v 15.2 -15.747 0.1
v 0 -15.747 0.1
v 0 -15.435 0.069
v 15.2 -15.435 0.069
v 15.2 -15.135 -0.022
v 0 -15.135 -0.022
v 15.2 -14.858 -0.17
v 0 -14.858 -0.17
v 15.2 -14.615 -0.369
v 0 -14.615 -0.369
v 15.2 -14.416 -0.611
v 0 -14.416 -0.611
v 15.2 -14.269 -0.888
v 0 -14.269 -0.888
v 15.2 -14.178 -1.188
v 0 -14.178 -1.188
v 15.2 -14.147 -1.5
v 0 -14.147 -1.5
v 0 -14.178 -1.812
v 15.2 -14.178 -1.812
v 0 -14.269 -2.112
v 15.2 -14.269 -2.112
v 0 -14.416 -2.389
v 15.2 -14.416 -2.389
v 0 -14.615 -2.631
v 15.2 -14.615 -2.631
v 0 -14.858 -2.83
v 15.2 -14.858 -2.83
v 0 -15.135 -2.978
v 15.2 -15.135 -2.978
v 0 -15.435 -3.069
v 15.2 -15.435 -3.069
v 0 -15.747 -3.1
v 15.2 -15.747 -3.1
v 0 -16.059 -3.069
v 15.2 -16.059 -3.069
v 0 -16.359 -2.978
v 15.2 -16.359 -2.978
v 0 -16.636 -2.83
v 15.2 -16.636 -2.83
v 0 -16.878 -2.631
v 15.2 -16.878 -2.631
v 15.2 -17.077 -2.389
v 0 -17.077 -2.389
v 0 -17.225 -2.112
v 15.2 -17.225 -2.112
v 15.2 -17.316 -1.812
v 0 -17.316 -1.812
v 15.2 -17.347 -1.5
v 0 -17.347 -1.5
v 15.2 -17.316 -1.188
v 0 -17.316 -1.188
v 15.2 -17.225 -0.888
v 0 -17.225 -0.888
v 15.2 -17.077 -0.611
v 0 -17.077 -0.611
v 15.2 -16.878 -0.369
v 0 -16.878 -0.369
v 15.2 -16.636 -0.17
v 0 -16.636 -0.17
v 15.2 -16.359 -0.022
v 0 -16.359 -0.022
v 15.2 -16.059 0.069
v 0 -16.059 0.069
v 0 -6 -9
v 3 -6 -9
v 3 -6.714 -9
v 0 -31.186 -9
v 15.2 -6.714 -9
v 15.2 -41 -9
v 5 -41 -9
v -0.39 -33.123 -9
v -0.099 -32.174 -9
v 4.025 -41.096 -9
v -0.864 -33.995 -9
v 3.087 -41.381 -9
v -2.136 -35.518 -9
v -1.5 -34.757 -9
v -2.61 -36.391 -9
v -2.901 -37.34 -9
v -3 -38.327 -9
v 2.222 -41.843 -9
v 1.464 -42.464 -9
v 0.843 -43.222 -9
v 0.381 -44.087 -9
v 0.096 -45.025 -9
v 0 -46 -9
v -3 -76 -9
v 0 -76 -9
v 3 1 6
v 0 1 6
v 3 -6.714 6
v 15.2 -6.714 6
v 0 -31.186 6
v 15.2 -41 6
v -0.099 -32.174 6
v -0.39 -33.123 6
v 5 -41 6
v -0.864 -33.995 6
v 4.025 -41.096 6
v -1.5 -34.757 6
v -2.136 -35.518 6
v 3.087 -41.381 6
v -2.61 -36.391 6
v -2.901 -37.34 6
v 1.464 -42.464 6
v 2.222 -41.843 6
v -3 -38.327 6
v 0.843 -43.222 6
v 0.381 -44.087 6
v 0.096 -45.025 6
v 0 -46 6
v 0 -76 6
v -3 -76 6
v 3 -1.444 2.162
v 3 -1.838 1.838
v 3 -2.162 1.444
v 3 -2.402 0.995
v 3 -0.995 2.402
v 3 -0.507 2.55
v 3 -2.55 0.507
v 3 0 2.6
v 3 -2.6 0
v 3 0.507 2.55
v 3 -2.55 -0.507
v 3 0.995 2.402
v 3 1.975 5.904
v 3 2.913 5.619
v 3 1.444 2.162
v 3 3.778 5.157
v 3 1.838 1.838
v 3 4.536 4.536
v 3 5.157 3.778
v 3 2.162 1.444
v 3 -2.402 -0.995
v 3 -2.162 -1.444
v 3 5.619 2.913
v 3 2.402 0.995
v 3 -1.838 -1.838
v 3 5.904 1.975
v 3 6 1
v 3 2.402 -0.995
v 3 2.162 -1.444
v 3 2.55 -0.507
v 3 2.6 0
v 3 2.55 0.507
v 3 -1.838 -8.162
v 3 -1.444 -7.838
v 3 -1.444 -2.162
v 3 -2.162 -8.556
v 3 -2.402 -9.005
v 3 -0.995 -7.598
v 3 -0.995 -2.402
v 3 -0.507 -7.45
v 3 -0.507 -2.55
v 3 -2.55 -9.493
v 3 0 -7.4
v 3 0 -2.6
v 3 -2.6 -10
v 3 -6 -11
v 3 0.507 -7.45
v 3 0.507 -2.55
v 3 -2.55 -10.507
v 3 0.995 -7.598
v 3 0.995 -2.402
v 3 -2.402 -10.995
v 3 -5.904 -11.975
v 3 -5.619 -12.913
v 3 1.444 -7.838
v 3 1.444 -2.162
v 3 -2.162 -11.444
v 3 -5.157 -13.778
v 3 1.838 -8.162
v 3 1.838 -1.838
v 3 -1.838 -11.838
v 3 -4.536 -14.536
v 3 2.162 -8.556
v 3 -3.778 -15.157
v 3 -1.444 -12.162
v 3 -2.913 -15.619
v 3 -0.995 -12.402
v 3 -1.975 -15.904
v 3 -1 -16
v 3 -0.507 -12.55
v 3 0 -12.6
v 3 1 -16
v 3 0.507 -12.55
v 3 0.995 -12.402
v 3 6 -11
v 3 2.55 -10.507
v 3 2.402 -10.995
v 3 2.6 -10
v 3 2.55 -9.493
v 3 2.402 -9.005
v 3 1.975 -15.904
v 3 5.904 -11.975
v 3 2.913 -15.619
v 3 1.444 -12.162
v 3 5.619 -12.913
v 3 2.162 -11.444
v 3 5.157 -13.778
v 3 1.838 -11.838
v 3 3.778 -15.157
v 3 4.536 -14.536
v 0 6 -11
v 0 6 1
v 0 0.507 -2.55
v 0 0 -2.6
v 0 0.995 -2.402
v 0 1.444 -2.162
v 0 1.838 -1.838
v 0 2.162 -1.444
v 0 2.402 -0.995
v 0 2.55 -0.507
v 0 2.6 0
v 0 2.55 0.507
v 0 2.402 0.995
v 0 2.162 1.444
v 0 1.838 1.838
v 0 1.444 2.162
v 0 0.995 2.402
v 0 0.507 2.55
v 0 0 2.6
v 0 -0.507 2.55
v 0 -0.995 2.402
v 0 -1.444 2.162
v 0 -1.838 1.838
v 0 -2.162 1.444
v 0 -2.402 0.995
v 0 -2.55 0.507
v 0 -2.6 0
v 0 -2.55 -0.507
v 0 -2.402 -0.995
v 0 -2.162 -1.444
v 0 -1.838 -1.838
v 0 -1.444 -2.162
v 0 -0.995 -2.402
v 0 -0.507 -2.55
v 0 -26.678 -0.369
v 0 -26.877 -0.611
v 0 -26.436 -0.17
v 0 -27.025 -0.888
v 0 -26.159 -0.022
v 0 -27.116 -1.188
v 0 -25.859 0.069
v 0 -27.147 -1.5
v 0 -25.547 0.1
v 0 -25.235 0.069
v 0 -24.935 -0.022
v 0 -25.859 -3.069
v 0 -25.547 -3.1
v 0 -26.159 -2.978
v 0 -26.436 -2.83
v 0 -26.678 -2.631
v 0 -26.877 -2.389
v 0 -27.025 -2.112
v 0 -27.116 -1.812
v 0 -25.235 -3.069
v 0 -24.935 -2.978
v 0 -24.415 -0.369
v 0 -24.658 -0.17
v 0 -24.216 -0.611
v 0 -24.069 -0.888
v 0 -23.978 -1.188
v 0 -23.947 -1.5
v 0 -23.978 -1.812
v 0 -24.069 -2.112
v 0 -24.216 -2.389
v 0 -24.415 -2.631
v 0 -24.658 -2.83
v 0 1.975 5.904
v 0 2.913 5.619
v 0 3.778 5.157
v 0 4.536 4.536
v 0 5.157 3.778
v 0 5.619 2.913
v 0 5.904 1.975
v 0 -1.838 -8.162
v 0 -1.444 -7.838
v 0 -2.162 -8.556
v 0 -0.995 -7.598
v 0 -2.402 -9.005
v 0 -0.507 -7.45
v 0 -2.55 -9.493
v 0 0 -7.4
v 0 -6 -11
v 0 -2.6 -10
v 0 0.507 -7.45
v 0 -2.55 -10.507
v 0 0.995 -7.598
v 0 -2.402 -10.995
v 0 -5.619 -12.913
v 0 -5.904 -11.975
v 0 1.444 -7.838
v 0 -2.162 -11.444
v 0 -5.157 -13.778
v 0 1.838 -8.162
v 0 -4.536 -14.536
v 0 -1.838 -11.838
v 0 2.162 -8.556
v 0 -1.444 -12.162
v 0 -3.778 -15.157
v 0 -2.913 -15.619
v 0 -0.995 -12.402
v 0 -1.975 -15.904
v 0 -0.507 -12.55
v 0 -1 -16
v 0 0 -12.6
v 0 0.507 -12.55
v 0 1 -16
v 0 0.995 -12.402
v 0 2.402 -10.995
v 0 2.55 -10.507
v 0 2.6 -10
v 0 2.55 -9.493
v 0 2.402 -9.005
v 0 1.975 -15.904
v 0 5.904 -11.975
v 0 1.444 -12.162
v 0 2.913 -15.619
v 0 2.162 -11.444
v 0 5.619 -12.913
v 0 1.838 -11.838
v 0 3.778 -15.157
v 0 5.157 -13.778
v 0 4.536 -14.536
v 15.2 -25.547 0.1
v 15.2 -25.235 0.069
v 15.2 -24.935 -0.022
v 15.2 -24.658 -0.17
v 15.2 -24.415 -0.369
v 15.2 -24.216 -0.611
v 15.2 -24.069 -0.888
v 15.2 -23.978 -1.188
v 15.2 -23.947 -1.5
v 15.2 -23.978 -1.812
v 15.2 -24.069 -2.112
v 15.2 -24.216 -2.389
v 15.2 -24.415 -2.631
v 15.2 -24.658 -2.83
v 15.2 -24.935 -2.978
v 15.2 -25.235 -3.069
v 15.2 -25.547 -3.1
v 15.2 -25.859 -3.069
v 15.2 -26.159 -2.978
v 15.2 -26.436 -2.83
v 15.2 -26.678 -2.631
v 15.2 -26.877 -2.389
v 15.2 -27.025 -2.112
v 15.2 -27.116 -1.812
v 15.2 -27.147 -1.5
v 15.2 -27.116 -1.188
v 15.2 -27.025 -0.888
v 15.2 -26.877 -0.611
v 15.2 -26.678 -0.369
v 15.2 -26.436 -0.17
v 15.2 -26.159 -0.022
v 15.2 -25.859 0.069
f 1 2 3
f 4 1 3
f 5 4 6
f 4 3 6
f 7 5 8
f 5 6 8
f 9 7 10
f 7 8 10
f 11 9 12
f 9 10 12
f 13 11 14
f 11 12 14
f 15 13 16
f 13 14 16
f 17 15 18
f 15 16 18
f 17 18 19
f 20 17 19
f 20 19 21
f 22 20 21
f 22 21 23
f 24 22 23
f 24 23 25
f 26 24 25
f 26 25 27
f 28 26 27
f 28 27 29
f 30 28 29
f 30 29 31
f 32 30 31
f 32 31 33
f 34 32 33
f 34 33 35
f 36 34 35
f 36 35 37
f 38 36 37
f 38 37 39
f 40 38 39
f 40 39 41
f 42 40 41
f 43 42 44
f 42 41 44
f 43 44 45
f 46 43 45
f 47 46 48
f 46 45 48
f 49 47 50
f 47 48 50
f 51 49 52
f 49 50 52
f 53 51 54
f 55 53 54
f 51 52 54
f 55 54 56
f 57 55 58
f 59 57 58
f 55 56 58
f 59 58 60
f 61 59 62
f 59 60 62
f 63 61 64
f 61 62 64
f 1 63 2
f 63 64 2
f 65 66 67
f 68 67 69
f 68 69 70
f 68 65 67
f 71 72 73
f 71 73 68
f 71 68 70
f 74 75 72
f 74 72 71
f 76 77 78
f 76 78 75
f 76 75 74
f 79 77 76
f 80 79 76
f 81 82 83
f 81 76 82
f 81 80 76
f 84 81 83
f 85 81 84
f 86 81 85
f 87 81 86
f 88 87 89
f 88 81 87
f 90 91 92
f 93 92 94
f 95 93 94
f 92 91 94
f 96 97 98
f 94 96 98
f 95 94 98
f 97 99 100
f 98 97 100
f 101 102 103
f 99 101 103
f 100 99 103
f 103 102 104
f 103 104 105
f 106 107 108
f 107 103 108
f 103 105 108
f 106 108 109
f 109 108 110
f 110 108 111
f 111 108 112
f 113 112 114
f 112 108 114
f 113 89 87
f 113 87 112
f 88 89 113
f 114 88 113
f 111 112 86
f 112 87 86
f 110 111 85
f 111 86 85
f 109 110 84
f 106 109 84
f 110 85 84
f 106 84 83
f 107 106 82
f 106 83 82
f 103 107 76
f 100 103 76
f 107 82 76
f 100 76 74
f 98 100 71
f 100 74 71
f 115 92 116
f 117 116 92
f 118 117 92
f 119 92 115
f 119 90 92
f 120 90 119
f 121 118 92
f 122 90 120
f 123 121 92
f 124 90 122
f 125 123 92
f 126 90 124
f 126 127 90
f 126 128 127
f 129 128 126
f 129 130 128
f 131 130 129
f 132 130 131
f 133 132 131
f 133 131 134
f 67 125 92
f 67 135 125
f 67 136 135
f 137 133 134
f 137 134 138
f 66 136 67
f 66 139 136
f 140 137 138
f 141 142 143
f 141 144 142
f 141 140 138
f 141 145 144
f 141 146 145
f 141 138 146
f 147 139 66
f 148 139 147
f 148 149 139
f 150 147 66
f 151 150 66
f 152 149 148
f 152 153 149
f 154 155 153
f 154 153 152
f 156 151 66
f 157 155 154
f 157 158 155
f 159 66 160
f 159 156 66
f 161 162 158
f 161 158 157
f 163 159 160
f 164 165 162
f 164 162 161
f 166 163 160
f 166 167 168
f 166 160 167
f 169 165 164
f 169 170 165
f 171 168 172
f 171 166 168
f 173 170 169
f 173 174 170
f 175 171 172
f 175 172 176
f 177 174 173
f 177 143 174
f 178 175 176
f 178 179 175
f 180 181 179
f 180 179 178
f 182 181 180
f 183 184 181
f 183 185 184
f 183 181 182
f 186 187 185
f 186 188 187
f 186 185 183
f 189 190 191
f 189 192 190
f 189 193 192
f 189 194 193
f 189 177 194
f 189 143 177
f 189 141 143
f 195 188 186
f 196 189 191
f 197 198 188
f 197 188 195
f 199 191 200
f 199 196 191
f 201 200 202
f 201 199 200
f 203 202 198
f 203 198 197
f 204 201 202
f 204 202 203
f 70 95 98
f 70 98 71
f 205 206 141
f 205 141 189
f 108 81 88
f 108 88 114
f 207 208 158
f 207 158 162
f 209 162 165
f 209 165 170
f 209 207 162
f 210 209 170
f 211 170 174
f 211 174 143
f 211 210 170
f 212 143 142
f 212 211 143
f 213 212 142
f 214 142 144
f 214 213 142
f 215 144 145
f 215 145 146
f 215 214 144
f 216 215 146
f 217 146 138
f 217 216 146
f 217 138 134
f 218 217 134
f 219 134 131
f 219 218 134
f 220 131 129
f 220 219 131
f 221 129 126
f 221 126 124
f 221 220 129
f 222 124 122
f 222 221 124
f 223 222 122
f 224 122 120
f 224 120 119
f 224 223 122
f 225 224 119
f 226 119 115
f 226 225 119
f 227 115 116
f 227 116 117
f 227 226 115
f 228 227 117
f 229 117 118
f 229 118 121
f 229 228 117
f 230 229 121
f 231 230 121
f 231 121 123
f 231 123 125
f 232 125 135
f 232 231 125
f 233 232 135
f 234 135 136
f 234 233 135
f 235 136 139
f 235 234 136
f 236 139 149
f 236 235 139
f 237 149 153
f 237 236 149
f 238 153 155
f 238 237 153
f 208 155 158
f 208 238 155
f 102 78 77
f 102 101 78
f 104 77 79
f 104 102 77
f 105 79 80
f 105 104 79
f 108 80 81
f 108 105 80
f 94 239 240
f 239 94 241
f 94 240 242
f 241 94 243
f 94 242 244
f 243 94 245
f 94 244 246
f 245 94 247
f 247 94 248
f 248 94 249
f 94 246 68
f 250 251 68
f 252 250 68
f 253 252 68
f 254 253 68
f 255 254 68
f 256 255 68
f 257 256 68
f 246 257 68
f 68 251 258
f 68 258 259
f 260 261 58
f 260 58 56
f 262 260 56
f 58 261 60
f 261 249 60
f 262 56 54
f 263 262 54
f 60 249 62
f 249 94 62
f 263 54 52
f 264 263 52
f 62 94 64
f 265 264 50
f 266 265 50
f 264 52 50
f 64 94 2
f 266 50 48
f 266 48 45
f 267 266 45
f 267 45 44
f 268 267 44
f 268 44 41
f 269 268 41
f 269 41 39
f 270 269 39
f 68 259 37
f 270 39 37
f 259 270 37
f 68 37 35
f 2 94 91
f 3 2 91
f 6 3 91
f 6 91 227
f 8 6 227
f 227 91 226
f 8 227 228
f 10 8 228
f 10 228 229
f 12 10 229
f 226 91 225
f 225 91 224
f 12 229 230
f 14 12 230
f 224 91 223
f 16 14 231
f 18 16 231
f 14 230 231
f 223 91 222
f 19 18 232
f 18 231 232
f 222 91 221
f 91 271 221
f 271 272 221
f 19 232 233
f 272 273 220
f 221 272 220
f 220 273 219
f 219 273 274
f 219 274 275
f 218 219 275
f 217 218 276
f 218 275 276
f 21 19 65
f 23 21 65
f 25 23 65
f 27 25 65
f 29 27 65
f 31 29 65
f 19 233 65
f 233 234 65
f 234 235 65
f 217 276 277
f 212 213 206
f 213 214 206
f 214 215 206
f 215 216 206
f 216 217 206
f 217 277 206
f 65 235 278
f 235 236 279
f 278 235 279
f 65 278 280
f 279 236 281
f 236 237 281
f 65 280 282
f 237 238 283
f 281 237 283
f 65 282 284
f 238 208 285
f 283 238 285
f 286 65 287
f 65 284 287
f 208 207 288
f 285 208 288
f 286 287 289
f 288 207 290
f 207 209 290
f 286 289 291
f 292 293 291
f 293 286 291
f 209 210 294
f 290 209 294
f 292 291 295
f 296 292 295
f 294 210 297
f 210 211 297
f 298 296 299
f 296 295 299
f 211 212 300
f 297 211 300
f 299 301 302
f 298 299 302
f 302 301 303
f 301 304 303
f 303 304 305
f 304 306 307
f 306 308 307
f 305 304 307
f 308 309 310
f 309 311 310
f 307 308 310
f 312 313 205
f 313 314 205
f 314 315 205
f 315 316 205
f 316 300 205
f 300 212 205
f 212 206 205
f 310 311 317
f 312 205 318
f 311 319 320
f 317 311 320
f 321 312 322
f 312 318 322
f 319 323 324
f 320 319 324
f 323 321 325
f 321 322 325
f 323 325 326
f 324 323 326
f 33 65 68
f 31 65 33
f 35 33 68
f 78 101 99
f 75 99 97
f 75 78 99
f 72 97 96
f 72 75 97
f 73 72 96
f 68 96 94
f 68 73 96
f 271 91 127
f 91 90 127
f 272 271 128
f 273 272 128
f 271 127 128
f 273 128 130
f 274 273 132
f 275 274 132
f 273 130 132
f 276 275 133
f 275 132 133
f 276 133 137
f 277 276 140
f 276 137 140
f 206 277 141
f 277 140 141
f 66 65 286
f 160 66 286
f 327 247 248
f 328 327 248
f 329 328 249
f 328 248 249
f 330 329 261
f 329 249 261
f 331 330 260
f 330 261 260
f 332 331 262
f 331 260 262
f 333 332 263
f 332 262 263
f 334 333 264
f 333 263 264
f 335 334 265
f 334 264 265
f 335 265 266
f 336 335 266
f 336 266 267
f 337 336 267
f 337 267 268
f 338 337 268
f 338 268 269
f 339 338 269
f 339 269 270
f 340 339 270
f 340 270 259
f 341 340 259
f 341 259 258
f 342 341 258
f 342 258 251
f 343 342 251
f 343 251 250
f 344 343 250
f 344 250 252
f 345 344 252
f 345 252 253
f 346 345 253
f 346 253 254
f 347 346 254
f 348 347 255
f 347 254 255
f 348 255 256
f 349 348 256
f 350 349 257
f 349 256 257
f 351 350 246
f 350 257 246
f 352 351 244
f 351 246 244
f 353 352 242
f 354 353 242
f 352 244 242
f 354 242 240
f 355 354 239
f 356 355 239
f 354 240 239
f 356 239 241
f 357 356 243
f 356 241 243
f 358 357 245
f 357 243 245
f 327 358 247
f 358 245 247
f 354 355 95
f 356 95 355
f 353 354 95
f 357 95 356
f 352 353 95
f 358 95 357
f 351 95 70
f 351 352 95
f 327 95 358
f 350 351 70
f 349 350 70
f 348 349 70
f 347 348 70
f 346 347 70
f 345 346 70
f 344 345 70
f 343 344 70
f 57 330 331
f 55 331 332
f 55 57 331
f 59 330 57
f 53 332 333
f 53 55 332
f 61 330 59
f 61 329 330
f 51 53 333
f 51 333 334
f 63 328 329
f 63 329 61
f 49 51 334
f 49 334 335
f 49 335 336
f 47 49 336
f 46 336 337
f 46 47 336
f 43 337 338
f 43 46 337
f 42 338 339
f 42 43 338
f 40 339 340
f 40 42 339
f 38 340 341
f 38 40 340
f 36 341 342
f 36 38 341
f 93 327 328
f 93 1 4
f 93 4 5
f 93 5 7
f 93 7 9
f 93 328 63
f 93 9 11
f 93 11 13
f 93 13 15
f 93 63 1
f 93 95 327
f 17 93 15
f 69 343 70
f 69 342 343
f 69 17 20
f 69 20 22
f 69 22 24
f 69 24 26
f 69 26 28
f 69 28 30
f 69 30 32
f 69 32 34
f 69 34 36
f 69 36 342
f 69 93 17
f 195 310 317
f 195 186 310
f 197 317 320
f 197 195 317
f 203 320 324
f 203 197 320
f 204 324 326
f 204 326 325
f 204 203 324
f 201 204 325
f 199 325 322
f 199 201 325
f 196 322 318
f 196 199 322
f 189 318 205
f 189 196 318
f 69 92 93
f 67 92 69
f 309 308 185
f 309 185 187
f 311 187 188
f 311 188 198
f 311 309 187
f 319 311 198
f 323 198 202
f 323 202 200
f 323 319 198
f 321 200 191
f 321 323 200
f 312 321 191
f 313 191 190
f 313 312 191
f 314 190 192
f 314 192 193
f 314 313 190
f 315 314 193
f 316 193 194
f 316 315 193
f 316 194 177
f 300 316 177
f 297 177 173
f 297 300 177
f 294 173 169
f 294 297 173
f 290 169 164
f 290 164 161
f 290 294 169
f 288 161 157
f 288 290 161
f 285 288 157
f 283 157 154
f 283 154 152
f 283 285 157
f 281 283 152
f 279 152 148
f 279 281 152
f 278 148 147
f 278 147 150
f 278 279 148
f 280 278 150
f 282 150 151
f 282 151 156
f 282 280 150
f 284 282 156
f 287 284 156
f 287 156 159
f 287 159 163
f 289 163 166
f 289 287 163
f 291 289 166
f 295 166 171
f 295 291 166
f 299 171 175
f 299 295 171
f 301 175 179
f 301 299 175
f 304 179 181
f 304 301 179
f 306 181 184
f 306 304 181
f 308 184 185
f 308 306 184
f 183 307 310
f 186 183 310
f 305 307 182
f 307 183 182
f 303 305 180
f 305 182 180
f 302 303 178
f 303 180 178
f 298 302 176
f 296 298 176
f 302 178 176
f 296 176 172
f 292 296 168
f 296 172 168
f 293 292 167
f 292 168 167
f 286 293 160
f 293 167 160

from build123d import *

# Parameters (mm, degrees)
SKETCH1_W           = 22
SKETCH1_H           = 12
SKETCH1_R           = 2.6
BOSS_EXTRUDE1_DEPTH = 3
SKETCH2_W           = 15
SKETCH2_H           = 36
BOSS_EXTRUDE2_DEPTH = 3
FILLET1_R           = 5
FILLET2_R           = 1
SKETCH4_W           = 15
SKETCH4_H           = 34.286255804
BOSS_EXTRUDE3_DEPTH = 12.2
SKETCH9_R           = 1.6
CUT_EXTRUDE1_DEPTH  = 40
SKETCH12_W          = 15
SKETCH12_H          = 40.231404522
BOSS_EXTRUDE5_DEPTH = 3
FILLET3_R           = 5
FILLET4_R           = 5
SKETCH14_W          = 15
SKETCH14_H          = 1.024404938
CUT_EXTRUDE2_DEPTH  = 3
FILLET5_R           = 5


with BuildPart() as part:
    # Sketch1 → Boss-Extrude1 (new body)
    with BuildSketch(Plane(origin=(0, 0, 0), x_dir=(0, 0, -1), z_dir=(1, 0, 0))):
        with Locations((5, 0)):
            Rectangle(SKETCH1_W, SKETCH1_H)
        with Locations((10, 0)):
            Circle(SKETCH1_R, mode=Mode.SUBTRACT)
        Circle(SKETCH1_R, mode=Mode.SUBTRACT)
    extrude(amount=BOSS_EXTRUDE1_DEPTH)

    # Sketch2 → Boss-Extrude2 (add)
    with BuildSketch(Plane(origin=(0, 0, 0), x_dir=(0, 0, -1), z_dir=(1, 0, 0))):
        with Locations((1.5, -24)):
            Rectangle(SKETCH2_W, SKETCH2_H)
    extrude(amount=BOSS_EXTRUDE2_DEPTH)

    # Fillet1
    fillet1_edges = [part.edges().sort_by_distance(p)[0] for p in [
        (1.5, -6, -16),
        (1.5, 6, 6),
        (1.5, 6, -16),
    ]]
    fillet(fillet1_edges, radius=FILLET1_R)

    # Fillet2
    fillet2_edges = [part.edges().sort_by_distance(p)[0] for p in [
        (1.5, -42, 6),
        (1.5, -42, -9),
    ]]
    fillet(fillet2_edges, radius=FILLET2_R)

    # Sketch4 → Boss-Extrude3 (add)
    with BuildSketch(Plane(origin=(3, 0, 0), x_dir=(0, 0, -1), z_dir=(1, 0, 0))):
        with Locations((1.5, -23.856872098)):
            Rectangle(SKETCH4_W, SKETCH4_H)
    extrude(amount=BOSS_EXTRUDE3_DEPTH)

    # Sketch9 → Cut-Extrude1 (cut)
    with BuildSketch(Plane.ZY):
        with Locations((-1.5, -25.546825535)):
            Circle(SKETCH9_R)
        with Locations((-1.5, -15.746825535)):
            Circle(SKETCH9_R)
    extrude(amount=-CUT_EXTRUDE1_DEPTH, mode=Mode.SUBTRACT)

    # Sketch12 → Boss-Extrude5 (add)
    with BuildSketch(Plane.ZY):
        with Locations((-1.5, -55.884297739)):
            Rectangle(SKETCH12_W, SKETCH12_H)
    extrude(amount=BOSS_EXTRUDE5_DEPTH)

    # Fillet3
    # the kernel refuses this fillet: 5 mm, written as the material it adds along each edge
    with BuildSketch(Plane(origin=(0, -35.768595478, -9), x_dir=(0, 1, 0), z_dir=(0, 0, 1))) as fillet3_piece_1:
        with BuildLine():
            CenterArc((4.582575695, 5), FILLET3_R, 203.578178478, 66.421821522)
            Line((0, 3), (-0.091651514, 2.96))
            ThreePointArc((-0.091651514, 2.96), (-0.1, 1.5), (-0.1, 0))
            Line((-0.1, 0), (0, -0.1))
            Line((0, -0.1), (4.582575695, -0.1))
            Line((4.582575695, -0.1), (4.582575695, 0))
        make_face()
    extrude(amount=15)

    # Fillet4
    fillet4_edges = [part.edges().sort_by_distance(p)[0] for p in [
        (-3, -35.768595478, -1.5),
    ]]
    fillet(fillet4_edges, radius=FILLET4_R)

    # Sketch14 → Cut-Extrude2 (cut)
    with BuildSketch(Plane(origin=(3, 0, 0), x_dir=(0, 0, -1), z_dir=(1, 0, 0))):
        with Locations((1.5, -41.512202469)):
            Rectangle(SKETCH14_W, SKETCH14_H)
    extrude(amount=-CUT_EXTRUDE2_DEPTH, mode=Mode.SUBTRACT)

    # Fillet5
    fillet5_edges = [part.edges().sort_by_distance(p)[0] for p in [
        (0, -41, -1.5),
    ]]
    fillet(fillet5_edges, radius=FILLET5_R)


solid = part.part
